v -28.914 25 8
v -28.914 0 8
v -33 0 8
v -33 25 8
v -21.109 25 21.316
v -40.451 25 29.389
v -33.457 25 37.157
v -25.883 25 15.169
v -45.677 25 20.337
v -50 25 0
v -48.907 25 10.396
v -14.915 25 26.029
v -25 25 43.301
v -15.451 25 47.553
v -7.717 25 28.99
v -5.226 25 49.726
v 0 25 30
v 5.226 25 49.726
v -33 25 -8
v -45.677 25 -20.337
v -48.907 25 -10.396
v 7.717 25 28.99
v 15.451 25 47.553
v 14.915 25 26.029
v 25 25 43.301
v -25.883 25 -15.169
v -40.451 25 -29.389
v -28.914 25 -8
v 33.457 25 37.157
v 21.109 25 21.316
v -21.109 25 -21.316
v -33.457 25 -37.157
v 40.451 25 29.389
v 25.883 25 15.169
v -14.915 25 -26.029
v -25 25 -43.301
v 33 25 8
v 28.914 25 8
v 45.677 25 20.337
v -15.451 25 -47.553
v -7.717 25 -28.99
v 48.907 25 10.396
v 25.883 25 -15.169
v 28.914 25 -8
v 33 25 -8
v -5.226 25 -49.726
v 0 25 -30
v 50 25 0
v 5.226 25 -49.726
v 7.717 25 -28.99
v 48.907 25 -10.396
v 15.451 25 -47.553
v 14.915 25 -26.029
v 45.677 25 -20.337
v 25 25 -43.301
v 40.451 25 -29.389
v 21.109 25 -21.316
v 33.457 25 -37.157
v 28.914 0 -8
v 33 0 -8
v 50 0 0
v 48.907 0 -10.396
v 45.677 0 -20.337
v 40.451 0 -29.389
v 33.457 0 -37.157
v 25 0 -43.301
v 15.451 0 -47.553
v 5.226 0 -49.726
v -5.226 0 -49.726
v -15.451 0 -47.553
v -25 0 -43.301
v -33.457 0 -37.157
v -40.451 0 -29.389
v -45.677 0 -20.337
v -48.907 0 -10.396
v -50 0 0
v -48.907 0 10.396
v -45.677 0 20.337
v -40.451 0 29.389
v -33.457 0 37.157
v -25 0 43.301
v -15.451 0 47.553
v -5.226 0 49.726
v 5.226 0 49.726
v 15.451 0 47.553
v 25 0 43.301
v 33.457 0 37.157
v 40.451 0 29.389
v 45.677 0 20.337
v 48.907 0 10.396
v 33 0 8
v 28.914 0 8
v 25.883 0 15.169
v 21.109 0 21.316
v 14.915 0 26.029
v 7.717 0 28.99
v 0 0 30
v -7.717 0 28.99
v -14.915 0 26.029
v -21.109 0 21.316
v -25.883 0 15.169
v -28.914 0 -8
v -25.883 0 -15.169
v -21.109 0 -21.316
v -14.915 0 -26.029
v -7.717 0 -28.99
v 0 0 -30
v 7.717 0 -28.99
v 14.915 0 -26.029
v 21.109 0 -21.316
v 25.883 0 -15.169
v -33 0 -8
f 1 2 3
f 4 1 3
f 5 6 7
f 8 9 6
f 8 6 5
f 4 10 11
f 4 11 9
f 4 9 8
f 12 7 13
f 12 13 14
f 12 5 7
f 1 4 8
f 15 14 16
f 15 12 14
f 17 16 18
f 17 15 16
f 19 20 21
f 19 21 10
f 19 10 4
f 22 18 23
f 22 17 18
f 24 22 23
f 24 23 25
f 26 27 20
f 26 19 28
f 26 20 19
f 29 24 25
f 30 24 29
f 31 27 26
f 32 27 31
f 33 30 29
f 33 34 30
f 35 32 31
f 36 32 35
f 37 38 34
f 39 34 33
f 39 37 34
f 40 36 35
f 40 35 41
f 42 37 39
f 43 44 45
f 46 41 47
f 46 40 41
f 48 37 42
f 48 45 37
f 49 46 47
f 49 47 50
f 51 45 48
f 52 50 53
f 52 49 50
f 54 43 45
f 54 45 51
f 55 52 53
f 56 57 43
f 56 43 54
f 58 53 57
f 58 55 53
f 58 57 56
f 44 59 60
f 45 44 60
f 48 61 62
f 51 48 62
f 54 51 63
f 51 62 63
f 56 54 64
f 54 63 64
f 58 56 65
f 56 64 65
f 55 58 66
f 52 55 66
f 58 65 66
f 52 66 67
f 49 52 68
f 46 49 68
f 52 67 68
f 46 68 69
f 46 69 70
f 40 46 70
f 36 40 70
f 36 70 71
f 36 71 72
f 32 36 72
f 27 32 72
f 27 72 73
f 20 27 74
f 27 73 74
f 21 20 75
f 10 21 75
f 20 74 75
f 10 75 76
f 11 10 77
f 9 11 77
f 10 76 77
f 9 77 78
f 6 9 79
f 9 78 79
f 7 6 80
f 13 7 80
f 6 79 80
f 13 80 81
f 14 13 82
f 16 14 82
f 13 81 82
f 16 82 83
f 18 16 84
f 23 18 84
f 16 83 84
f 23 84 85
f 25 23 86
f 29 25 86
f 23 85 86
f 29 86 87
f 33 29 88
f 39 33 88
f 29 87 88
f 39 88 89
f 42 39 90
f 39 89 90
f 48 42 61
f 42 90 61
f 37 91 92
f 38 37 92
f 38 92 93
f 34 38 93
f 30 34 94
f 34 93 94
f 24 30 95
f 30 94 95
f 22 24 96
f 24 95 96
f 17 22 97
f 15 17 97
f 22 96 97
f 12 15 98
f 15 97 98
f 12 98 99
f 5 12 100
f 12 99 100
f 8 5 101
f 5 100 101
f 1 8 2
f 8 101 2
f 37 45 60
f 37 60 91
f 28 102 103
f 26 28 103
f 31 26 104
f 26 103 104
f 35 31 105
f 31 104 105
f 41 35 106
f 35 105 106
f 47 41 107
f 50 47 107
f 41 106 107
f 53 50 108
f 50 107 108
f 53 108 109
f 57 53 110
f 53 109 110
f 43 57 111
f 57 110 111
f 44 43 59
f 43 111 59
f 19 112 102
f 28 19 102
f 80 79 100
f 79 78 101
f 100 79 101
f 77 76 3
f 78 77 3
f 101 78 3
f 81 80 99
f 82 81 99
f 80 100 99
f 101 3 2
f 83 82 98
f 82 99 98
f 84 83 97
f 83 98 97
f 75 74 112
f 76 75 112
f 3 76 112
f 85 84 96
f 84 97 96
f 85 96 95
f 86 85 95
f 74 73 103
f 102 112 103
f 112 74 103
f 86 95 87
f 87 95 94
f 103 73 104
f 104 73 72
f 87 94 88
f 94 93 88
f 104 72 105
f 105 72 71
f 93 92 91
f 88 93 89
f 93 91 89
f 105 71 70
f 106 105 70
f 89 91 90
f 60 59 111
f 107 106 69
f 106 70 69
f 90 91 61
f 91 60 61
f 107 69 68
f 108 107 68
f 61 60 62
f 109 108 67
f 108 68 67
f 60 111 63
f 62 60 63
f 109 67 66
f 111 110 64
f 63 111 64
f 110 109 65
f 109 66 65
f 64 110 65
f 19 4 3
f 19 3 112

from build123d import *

# Parameters (mm, degrees)
SKETCH2_R           = 50
BOSS_EXTRUDE1_DEPTH = 25


with BuildPart() as part:
    # Sketch2 → Boss-Extrude1 (new body)
    with BuildSketch(Plane(origin=(0, 0, 0), x_dir=(1, 0, 0), z_dir=(0, 1, 0))):
        Circle(SKETCH2_R)
        with BuildLine():
            Line((28.91366459, 8), (33, 8))
            Line((33, 8), (33, -8))
            Line((33, -8), (28.91366459, -8))
            ThreePointArc((28.91366459, -8), (0, -30), (-28.91366459, -8))
            Line((-28.91366459, -8), (-33, -8))
            Line((-33, -8), (-33, 8))
            Line((-33, 8), (-28.91366459, 8))
            ThreePointArc((-28.91366459, 8), (0, 30), (28.91366459, 8))
        make_face(mode=Mode.SUBTRACT)
    extrude(amount=BOSS_EXTRUDE1_DEPTH)


solid = part.part
